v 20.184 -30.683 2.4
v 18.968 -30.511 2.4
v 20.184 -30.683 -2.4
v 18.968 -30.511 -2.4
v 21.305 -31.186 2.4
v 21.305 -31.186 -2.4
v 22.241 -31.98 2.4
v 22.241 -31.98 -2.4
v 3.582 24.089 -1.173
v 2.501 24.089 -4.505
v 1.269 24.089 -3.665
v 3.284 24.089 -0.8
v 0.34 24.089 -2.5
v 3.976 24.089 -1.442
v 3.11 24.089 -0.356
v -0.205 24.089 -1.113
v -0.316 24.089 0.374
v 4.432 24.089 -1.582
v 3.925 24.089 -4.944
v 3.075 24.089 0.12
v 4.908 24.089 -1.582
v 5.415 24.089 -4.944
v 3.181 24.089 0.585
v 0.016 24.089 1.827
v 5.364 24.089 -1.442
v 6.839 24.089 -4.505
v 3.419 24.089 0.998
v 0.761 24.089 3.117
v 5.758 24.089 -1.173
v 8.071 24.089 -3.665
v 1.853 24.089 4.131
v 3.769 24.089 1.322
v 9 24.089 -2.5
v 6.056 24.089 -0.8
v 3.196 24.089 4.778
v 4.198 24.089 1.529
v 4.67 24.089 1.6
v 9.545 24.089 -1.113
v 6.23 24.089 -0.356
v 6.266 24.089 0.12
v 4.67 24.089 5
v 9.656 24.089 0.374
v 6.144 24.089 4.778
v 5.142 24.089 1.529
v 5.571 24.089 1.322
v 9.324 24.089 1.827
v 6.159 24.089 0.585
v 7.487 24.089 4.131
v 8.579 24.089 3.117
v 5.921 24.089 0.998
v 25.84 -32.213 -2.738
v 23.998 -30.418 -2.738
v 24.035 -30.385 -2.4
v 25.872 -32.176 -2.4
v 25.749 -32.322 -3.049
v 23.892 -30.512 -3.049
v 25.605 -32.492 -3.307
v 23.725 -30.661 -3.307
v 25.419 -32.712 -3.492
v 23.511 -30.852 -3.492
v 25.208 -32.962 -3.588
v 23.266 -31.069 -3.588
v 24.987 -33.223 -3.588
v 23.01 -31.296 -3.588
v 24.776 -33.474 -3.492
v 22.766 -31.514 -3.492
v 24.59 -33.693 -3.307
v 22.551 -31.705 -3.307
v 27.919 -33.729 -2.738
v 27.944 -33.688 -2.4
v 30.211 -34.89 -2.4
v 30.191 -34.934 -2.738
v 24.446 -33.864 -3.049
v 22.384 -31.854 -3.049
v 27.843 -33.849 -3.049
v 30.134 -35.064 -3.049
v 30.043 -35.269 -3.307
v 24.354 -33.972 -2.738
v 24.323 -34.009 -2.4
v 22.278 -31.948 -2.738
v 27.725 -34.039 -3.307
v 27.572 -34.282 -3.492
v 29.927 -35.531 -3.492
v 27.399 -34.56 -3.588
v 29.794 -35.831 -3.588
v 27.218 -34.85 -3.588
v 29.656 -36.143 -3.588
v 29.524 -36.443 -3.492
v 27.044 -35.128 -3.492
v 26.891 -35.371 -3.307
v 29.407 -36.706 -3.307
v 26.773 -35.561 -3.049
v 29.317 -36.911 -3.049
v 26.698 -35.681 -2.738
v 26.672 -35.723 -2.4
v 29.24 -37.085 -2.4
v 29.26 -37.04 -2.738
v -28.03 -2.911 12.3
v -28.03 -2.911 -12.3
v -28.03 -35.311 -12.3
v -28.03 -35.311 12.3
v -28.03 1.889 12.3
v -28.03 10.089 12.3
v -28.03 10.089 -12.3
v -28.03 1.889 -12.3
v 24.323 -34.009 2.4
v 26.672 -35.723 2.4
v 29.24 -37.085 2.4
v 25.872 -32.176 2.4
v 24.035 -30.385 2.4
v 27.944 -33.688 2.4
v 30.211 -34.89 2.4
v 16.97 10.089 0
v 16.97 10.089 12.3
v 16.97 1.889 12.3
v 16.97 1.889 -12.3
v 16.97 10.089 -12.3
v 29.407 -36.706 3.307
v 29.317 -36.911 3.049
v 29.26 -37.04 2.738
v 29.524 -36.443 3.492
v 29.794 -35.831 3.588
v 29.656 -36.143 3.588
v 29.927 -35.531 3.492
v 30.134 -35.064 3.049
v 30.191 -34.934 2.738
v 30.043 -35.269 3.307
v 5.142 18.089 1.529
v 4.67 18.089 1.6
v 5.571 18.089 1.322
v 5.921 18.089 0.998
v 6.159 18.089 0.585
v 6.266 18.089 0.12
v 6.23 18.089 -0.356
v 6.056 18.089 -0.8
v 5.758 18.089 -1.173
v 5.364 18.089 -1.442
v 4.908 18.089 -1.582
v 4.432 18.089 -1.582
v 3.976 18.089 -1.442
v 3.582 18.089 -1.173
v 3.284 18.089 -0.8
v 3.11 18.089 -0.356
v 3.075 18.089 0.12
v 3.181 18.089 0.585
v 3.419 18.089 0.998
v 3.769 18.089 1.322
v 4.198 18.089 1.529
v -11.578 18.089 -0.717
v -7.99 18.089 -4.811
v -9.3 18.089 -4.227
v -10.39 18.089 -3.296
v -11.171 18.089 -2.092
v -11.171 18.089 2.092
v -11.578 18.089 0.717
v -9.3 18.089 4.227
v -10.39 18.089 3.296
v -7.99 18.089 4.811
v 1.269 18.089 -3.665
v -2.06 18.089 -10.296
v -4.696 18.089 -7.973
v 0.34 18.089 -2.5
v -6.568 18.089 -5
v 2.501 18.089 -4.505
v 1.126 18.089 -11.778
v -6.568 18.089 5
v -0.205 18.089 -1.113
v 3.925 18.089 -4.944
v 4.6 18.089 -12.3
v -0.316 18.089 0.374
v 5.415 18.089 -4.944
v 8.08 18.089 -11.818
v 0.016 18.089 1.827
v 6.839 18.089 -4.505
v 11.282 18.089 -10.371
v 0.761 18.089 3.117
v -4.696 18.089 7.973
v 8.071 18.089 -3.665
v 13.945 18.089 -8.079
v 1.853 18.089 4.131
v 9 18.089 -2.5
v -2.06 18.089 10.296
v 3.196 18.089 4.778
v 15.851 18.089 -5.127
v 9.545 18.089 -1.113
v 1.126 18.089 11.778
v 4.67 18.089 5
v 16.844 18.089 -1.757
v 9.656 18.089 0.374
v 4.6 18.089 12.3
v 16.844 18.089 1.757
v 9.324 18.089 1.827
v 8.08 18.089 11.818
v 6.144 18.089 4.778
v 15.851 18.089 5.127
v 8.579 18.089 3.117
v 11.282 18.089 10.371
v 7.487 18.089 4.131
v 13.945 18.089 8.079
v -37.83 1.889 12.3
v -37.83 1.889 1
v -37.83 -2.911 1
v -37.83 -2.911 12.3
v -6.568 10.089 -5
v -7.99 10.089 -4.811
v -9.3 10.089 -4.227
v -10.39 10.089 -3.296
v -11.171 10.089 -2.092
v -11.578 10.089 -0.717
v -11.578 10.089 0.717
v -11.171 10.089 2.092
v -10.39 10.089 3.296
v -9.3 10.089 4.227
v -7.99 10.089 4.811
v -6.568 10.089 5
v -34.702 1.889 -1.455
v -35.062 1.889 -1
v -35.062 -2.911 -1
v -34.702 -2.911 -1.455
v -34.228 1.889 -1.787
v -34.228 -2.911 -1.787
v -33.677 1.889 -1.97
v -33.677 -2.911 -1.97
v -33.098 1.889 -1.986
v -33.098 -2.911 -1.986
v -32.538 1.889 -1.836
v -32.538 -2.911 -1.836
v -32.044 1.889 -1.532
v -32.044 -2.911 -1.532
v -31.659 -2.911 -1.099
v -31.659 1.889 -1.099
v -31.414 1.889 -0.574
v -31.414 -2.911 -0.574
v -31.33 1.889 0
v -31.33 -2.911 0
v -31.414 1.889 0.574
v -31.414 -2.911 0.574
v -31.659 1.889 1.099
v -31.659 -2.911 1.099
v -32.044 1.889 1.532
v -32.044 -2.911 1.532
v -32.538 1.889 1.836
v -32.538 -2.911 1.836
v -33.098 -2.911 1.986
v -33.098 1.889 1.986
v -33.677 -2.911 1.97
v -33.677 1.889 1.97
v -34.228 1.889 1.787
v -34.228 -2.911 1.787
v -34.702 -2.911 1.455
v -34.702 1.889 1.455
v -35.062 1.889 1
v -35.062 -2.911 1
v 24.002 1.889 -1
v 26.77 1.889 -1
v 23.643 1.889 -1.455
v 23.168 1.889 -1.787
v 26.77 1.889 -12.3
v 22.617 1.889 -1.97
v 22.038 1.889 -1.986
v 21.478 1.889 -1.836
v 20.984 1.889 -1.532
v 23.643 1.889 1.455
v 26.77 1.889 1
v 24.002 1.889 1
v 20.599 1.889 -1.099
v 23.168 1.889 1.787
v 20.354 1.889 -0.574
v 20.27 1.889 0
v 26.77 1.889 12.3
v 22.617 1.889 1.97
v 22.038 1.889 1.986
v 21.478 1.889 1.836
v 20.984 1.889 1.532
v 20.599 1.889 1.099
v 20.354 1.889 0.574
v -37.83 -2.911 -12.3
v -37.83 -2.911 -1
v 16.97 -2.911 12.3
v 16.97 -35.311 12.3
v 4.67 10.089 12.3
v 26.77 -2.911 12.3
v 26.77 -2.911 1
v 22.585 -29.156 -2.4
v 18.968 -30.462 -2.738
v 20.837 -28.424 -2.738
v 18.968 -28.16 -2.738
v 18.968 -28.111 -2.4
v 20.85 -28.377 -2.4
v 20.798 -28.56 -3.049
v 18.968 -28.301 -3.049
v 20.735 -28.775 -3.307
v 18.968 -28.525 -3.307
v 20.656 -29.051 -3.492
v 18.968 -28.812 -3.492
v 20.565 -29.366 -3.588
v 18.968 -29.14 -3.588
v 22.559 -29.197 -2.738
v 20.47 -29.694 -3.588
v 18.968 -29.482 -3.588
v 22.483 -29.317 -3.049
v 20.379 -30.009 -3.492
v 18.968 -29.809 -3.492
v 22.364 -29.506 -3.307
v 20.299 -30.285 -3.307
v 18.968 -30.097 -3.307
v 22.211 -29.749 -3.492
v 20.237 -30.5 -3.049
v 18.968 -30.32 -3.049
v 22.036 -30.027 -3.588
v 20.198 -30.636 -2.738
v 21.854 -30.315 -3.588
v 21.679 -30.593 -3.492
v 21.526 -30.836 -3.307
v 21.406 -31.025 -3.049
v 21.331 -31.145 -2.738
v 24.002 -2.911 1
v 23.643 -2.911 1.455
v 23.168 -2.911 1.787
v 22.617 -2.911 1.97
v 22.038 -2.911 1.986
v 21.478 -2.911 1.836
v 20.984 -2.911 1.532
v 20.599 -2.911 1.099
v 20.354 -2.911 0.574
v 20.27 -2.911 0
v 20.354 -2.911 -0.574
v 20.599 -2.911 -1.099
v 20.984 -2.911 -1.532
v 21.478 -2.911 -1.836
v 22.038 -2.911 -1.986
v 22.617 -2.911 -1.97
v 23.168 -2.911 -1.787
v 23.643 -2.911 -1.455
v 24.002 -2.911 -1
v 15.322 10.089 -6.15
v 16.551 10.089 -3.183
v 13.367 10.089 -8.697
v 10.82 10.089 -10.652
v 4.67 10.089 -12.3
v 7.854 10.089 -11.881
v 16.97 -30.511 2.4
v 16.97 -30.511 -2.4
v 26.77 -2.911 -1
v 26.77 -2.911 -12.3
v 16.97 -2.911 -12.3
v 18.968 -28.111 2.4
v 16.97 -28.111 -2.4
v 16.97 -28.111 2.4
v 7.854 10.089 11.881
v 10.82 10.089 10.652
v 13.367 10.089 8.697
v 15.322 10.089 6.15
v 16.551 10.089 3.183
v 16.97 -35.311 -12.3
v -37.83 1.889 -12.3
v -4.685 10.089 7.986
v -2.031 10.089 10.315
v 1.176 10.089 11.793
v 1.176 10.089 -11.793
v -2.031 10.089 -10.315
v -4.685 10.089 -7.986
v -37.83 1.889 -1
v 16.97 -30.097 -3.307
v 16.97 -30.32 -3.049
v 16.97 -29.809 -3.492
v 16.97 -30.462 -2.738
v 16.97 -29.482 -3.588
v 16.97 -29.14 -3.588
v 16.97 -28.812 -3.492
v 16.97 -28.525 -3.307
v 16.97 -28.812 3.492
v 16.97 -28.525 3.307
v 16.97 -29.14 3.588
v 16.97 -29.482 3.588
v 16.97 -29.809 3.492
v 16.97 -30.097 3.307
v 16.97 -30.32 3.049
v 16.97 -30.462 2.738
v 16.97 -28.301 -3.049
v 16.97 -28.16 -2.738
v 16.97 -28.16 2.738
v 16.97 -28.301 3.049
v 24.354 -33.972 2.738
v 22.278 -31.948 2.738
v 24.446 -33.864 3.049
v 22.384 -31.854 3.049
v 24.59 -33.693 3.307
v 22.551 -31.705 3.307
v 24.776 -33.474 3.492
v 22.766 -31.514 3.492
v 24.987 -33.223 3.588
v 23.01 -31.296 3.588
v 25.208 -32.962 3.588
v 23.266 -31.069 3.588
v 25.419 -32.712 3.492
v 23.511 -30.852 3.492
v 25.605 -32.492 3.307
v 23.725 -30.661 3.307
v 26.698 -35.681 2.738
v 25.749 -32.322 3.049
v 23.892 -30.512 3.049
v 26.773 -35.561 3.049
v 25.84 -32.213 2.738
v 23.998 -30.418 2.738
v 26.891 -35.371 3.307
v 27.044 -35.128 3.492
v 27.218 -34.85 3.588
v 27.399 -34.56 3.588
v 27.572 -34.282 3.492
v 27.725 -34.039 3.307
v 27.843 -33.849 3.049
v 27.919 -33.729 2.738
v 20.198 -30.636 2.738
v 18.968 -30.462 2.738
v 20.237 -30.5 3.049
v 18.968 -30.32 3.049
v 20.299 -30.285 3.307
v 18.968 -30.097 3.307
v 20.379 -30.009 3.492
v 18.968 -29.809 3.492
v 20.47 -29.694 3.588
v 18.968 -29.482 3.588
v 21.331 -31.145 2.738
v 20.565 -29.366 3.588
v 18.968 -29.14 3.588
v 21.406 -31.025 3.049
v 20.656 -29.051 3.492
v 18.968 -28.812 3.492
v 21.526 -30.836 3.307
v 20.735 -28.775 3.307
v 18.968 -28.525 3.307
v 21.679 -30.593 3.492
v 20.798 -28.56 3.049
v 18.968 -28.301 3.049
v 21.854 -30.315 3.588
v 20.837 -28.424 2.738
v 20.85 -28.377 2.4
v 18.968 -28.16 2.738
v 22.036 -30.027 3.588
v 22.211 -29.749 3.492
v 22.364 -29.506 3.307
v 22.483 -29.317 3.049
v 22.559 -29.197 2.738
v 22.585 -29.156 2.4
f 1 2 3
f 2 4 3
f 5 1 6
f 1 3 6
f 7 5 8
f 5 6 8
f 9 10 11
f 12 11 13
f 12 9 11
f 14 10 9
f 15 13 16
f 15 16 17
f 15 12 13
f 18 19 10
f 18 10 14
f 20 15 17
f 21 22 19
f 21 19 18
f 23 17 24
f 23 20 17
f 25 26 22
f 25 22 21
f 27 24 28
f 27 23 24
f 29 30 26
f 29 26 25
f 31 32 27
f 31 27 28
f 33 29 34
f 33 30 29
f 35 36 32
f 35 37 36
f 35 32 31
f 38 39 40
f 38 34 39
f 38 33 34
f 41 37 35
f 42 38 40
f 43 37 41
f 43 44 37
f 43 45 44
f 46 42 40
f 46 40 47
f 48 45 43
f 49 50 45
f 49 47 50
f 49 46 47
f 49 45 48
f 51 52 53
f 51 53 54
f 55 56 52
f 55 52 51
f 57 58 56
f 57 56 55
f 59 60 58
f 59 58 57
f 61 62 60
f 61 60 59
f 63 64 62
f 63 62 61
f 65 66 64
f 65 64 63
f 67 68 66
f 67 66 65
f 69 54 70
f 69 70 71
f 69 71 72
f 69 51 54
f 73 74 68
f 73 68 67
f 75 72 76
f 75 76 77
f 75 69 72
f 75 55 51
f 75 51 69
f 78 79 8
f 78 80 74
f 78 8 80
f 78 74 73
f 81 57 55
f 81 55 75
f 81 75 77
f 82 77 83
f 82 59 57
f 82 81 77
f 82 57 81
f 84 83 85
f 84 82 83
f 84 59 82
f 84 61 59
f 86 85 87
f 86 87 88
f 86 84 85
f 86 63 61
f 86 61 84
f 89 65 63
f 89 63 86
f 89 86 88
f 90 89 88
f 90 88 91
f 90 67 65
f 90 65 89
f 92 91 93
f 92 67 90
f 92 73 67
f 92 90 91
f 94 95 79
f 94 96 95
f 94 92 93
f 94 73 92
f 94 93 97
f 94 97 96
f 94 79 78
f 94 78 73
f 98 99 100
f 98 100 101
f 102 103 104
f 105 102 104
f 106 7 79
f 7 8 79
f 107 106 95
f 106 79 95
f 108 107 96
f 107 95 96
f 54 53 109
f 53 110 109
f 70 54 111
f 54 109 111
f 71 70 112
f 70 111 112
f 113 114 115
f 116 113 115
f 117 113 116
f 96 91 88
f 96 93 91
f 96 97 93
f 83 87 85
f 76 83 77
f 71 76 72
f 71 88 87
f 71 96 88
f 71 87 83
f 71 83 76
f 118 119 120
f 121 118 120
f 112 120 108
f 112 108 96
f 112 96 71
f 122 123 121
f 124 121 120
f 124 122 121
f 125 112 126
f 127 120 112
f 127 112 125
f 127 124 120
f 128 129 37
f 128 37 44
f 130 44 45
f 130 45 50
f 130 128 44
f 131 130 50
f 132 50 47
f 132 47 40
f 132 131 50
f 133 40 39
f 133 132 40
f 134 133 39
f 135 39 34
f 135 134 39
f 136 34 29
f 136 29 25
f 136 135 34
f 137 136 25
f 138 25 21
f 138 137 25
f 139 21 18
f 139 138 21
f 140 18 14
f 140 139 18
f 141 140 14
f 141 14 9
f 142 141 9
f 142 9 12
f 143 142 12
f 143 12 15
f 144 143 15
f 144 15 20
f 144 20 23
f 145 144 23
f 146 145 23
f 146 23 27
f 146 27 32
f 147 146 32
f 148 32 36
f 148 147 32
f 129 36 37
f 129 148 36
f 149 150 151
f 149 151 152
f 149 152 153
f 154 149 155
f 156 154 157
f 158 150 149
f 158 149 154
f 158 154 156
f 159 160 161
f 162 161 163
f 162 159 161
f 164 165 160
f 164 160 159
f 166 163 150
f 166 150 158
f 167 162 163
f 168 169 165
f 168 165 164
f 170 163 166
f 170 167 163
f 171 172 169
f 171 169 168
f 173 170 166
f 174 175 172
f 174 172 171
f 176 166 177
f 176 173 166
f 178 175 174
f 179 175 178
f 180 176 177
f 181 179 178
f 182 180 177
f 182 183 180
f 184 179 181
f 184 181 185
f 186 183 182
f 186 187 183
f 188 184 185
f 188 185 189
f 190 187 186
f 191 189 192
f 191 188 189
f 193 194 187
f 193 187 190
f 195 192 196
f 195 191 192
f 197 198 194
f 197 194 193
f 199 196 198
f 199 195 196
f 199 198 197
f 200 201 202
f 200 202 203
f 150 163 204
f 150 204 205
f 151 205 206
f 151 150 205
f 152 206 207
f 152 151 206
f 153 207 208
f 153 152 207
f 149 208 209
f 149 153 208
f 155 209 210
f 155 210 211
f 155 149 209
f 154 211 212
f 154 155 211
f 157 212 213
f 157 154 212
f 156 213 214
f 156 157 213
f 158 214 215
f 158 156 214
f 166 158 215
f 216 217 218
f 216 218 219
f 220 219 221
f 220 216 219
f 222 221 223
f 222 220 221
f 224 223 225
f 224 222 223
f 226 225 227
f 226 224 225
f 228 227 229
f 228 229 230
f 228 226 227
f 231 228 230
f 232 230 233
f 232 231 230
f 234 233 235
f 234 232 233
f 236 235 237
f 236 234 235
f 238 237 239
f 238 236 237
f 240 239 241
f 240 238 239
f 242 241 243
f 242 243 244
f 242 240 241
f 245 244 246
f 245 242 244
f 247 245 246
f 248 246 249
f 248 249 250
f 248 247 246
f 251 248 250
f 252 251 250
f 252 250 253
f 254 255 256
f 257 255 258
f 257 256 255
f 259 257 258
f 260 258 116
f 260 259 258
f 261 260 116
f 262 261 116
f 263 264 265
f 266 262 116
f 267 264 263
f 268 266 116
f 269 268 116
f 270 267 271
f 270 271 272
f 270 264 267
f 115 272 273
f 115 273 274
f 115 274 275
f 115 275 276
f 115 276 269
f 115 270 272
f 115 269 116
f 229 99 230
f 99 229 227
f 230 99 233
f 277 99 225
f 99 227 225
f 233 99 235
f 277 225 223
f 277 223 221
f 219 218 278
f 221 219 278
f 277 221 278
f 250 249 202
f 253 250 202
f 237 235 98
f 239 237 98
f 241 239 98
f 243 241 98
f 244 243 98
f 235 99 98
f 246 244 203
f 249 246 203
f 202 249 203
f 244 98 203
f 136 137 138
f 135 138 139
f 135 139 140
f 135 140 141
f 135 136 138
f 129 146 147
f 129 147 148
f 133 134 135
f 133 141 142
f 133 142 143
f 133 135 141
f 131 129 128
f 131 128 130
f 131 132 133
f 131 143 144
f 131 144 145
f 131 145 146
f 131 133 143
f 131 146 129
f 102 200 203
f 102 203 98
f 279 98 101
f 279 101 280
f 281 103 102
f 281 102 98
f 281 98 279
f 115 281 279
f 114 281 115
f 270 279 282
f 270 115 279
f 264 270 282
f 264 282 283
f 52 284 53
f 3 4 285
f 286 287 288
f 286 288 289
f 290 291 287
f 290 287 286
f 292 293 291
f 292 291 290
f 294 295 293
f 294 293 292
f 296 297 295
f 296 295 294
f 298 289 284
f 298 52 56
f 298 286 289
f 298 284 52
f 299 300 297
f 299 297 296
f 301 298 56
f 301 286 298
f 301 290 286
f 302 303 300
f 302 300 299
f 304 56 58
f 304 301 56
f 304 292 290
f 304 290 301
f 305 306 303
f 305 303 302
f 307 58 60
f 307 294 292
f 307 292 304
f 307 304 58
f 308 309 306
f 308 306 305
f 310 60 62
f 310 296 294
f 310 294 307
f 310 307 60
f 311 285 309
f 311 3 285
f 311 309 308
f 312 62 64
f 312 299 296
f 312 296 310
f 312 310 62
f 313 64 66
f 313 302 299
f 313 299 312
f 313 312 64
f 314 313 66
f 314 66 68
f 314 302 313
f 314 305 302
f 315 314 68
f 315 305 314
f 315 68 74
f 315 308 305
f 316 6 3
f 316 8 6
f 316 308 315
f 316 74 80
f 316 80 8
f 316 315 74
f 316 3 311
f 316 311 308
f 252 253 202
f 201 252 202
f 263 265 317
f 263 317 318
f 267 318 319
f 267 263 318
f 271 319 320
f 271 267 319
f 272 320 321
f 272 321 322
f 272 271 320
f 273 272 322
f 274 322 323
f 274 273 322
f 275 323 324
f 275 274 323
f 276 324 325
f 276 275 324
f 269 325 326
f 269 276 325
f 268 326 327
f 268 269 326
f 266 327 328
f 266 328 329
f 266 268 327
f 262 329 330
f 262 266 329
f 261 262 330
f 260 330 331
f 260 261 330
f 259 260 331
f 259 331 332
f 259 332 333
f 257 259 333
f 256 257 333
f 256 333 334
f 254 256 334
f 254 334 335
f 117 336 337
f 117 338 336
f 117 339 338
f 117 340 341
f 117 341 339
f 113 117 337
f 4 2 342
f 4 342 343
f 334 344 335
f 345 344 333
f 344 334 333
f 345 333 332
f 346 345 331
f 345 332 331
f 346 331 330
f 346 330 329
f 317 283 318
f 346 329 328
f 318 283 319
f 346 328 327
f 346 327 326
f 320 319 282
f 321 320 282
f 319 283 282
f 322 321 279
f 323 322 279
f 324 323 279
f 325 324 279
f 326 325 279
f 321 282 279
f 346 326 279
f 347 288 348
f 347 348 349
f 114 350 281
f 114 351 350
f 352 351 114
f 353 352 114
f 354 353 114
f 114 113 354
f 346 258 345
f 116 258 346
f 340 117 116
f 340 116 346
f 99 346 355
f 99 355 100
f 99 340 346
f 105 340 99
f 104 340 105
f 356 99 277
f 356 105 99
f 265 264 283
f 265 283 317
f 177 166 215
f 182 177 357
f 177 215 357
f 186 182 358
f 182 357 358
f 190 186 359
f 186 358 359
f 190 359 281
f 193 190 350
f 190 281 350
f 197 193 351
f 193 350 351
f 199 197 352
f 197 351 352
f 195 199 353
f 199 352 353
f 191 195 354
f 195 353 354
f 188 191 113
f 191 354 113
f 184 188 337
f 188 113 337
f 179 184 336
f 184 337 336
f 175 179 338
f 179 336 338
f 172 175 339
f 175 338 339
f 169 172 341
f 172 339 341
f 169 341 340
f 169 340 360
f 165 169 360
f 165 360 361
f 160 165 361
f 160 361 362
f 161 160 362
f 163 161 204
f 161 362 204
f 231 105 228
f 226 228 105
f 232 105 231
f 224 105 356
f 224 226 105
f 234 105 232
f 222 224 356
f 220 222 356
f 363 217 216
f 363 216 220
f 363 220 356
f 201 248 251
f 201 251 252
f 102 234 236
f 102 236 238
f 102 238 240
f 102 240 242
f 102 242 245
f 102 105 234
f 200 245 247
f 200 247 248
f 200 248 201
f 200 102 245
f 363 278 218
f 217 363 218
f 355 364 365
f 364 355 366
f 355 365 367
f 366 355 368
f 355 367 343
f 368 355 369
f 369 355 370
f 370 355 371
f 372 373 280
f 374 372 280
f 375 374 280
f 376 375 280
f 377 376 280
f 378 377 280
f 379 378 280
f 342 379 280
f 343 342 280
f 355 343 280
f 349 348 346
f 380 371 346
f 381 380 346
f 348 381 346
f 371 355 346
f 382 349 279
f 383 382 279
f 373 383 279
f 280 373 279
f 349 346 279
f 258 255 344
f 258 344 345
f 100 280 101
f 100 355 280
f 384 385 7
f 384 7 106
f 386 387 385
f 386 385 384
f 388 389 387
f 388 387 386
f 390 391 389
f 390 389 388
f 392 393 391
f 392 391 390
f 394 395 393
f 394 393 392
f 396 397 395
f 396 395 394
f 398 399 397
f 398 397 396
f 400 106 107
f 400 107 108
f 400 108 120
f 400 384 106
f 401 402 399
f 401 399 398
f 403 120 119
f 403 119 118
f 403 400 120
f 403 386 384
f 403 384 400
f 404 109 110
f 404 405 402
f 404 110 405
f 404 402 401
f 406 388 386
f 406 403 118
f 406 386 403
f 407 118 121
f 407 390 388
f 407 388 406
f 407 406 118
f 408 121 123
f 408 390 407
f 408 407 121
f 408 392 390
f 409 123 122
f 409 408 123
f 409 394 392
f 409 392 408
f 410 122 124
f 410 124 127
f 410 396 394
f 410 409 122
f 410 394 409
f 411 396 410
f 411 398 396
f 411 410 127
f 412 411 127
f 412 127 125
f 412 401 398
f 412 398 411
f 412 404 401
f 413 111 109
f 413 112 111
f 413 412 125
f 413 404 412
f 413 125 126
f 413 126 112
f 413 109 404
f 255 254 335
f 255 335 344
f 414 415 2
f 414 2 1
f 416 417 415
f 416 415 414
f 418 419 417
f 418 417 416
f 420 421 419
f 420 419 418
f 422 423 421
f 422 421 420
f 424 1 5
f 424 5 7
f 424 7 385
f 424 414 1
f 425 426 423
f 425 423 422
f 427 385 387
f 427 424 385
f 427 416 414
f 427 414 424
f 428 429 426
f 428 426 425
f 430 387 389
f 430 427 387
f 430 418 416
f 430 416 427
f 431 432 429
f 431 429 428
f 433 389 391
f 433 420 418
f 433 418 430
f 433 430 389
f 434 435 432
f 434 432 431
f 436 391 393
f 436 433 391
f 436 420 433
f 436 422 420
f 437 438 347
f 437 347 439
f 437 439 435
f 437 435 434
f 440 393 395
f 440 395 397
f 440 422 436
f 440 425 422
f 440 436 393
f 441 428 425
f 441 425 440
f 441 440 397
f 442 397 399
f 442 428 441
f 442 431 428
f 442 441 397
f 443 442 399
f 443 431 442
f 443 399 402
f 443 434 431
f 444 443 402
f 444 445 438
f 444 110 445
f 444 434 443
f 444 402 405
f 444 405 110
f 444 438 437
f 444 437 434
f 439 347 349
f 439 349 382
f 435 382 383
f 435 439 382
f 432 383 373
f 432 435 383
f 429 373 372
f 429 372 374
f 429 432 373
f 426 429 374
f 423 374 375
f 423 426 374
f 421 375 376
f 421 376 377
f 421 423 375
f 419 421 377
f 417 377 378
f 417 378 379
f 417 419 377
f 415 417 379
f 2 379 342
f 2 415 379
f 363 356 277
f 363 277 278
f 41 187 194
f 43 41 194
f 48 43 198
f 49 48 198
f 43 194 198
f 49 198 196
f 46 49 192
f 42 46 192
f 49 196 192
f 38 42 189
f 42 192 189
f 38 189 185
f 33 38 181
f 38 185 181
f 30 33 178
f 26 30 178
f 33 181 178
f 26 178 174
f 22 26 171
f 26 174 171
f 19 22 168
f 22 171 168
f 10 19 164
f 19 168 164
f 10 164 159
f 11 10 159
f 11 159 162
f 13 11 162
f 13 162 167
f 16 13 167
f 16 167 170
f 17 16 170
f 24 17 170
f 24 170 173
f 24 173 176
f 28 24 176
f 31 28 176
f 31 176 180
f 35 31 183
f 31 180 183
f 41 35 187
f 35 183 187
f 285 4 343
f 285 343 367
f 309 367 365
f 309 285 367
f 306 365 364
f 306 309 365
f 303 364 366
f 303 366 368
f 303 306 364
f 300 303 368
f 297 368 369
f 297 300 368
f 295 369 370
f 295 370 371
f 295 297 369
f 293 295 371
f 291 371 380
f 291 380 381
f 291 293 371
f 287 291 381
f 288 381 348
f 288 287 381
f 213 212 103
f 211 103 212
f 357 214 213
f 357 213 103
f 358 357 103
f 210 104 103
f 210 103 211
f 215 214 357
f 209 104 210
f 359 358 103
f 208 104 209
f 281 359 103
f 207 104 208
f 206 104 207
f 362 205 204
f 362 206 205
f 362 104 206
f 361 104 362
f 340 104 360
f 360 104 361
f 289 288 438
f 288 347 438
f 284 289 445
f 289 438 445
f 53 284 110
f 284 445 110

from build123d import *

# Parameters (mm, degrees)
SKETCH1_R               = 6.15
BOSS_EXTRUDE1_DEPTH     = 4
SKETCH2_W               = 22.5
SKETCH2_H               = 12.3
BOSS_EXTRUDE2_DEPTH     = 4.1
BOSS_EXTRUDE3_DEPTH     = 2.4
SKETCH4_W               = 22.5
SKETCH4_H               = 12.3
BOSS_EXTRUDE4_DEPTH     = 23
CUT_EXTRUDE1_DEPTH      = 39.381017444
CUT_EXTRUDE1_DEPTH_BACK = 39.381017444
SKETCH6_R               = 2.5
BOSS_EXTRUDE5_DEPTH     = 23
SKETCH7_R               = 2.5
SKETCH7_R_2             = 0.8
BOSS_EXTRUDE6_DEPTH     = 3
SCALE1_SCALE            = 2


with BuildPart() as part:
    # Sketch1 → Boss-Extrude1 (new body)
    with BuildSketch(Plane(origin=(0, 0, 0), x_dir=(1, 0, 0), z_dir=(0, 1, 0))):
        with Locations(Location((0, 0, 0), (0, 0, 270))):
            Circle(SKETCH1_R)
    extrude(amount=BOSS_EXTRUDE1_DEPTH)

    # Sketch2 → Boss-Extrude2 (add)
    with BuildSketch(Plane(origin=(0, 0, 0), x_dir=(1, 0, 0), z_dir=(0, 1, 0))):
        with Locations((-5.1, 0)):
            Rectangle(SKETCH2_W, SKETCH2_H)
    extrude(amount=-BOSS_EXTRUDE2_DEPTH)

    # Sketch3 → Boss-Extrude3 (add)
    with BuildSketch(Plane.XZ.offset(4.1)):
        with BuildLine():
            Line((-21.25, 6.15), (11.05, 6.15))
            Line((11.05, 6.15), (11.05, 0.5))
            Line((11.05, 0.5), (9.666025404, 0.5))
            ThreePointArc((9.666025404, 0.5), (7.8, 0), (9.666025404, -0.5))
            Line((9.666025404, -0.5), (11.05, -0.5))
            Line((11.05, -0.5), (11.05, -6.15))
            Line((11.05, -6.15), (-21.25, -6.15))
            Line((-21.25, -6.15), (-21.25, -0.5))
            Line((-21.25, -0.5), (-19.866025404, -0.5))
            ThreePointArc((-19.866025404, -0.5), (-18, 0), (-19.866025404, 0.5))
            Line((-19.866025404, 0.5), (-21.25, 0.5))
            Line((-21.25, 0.5), (-21.25, 6.15))
        make_face()
    extrude(amount=BOSS_EXTRUDE3_DEPTH)

    # Sketch4 → Boss-Extrude4 (add)
    with BuildSketch(Plane.XZ.offset(6.5)):
        with Locations((-5.1, 0)):
            Rectangle(SKETCH4_W, SKETCH4_H)
    extrude(amount=BOSS_EXTRUDE4_DEPTH)

    # Sketch5 → Cut-Extrude1 (cut, two sides: drawn at the far end of the back side and taken through both)
    with BuildSketch(Plane.XY.offset(6.15).offset(-CUT_EXTRUDE1_DEPTH_BACK)):
        Polygon((113.386591398, -22.7), (14.208205906, -22.7), (-24.661428279, -22.7), (-123.83981377, -22.7), (-123.83981377, -221.056770983), (113.386591398, -221.056770983), align=None)
    extrude(amount=CUT_EXTRUDE1_DEPTH + CUT_EXTRUDE1_DEPTH_BACK, mode=Mode.SUBTRACT)

    # Sketch6 → Boss-Extrude5 (add)
    with BuildSketch(Plane(origin=(0, 4, 0), x_dir=(1, 0, 0), z_dir=(0, 1, 0))):
        with Locations((-5.65, 0)):
            Circle(SKETCH6_R)
    extrude(amount=-BOSS_EXTRUDE5_DEPTH)

    # Sketch7 → Boss-Extrude6 (add)
    with BuildSketch(Plane(origin=(0, 4, 0), x_dir=(1, 0, 0), z_dir=(0, 1, 0))):
        with Locations(Location((0, 0, 0), (0, 0, 270))):
            Circle(SKETCH7_R)
        with Locations(Location((0, 0, 0), (0, 0, 270))):
            Circle(SKETCH7_R_2, mode=Mode.SUBTRACT)
    extrude(amount=BOSS_EXTRUDE6_DEPTH)

    # Sweep1: sweep along a path in Sketch9
    with BuildLine(Plane.XY) as sweep1_path:
        Line((6.15, -19.7), (7.149053508, -19.7))
        ThreePointArc((7.149053508, -19.7), (8.291747726, -19.944708597), (9.23401566, -20.63591299))
        ThreePointArc((9.23401566, -20.63591299), (10.752004703, -22.013665811), (12.527651525, -23.038151992))
    # Sketch8 → Sweep1 (sweep)
    with BuildSketch(Plane(origin=(6.15, 0, 0), x_dir=(0, 0, -1), z_dir=(1, 0, 0))):
        with BuildLine():
            Line((-1.2, -19.1), (1.2, -19.1))
            ThreePointArc((1.2, -19.1), (1.8, -19.7), (1.2, -20.3))
            Line((1.2, -20.3), (-1.2, -20.3))
            ThreePointArc((-1.2, -20.3), (-1.8, -19.7), (-1.2, -19.1))
        make_face()
    sweep(path=sweep1_path.line)


with BuildPart() as part_1:
    # Scale1: scaled about (-4.670030393, -10.089014718, 0)
    add(part.part.scale(SCALE1_SCALE).moved(Location((4.670030393, 10.089014718, 0))))


solid = part_1.part
